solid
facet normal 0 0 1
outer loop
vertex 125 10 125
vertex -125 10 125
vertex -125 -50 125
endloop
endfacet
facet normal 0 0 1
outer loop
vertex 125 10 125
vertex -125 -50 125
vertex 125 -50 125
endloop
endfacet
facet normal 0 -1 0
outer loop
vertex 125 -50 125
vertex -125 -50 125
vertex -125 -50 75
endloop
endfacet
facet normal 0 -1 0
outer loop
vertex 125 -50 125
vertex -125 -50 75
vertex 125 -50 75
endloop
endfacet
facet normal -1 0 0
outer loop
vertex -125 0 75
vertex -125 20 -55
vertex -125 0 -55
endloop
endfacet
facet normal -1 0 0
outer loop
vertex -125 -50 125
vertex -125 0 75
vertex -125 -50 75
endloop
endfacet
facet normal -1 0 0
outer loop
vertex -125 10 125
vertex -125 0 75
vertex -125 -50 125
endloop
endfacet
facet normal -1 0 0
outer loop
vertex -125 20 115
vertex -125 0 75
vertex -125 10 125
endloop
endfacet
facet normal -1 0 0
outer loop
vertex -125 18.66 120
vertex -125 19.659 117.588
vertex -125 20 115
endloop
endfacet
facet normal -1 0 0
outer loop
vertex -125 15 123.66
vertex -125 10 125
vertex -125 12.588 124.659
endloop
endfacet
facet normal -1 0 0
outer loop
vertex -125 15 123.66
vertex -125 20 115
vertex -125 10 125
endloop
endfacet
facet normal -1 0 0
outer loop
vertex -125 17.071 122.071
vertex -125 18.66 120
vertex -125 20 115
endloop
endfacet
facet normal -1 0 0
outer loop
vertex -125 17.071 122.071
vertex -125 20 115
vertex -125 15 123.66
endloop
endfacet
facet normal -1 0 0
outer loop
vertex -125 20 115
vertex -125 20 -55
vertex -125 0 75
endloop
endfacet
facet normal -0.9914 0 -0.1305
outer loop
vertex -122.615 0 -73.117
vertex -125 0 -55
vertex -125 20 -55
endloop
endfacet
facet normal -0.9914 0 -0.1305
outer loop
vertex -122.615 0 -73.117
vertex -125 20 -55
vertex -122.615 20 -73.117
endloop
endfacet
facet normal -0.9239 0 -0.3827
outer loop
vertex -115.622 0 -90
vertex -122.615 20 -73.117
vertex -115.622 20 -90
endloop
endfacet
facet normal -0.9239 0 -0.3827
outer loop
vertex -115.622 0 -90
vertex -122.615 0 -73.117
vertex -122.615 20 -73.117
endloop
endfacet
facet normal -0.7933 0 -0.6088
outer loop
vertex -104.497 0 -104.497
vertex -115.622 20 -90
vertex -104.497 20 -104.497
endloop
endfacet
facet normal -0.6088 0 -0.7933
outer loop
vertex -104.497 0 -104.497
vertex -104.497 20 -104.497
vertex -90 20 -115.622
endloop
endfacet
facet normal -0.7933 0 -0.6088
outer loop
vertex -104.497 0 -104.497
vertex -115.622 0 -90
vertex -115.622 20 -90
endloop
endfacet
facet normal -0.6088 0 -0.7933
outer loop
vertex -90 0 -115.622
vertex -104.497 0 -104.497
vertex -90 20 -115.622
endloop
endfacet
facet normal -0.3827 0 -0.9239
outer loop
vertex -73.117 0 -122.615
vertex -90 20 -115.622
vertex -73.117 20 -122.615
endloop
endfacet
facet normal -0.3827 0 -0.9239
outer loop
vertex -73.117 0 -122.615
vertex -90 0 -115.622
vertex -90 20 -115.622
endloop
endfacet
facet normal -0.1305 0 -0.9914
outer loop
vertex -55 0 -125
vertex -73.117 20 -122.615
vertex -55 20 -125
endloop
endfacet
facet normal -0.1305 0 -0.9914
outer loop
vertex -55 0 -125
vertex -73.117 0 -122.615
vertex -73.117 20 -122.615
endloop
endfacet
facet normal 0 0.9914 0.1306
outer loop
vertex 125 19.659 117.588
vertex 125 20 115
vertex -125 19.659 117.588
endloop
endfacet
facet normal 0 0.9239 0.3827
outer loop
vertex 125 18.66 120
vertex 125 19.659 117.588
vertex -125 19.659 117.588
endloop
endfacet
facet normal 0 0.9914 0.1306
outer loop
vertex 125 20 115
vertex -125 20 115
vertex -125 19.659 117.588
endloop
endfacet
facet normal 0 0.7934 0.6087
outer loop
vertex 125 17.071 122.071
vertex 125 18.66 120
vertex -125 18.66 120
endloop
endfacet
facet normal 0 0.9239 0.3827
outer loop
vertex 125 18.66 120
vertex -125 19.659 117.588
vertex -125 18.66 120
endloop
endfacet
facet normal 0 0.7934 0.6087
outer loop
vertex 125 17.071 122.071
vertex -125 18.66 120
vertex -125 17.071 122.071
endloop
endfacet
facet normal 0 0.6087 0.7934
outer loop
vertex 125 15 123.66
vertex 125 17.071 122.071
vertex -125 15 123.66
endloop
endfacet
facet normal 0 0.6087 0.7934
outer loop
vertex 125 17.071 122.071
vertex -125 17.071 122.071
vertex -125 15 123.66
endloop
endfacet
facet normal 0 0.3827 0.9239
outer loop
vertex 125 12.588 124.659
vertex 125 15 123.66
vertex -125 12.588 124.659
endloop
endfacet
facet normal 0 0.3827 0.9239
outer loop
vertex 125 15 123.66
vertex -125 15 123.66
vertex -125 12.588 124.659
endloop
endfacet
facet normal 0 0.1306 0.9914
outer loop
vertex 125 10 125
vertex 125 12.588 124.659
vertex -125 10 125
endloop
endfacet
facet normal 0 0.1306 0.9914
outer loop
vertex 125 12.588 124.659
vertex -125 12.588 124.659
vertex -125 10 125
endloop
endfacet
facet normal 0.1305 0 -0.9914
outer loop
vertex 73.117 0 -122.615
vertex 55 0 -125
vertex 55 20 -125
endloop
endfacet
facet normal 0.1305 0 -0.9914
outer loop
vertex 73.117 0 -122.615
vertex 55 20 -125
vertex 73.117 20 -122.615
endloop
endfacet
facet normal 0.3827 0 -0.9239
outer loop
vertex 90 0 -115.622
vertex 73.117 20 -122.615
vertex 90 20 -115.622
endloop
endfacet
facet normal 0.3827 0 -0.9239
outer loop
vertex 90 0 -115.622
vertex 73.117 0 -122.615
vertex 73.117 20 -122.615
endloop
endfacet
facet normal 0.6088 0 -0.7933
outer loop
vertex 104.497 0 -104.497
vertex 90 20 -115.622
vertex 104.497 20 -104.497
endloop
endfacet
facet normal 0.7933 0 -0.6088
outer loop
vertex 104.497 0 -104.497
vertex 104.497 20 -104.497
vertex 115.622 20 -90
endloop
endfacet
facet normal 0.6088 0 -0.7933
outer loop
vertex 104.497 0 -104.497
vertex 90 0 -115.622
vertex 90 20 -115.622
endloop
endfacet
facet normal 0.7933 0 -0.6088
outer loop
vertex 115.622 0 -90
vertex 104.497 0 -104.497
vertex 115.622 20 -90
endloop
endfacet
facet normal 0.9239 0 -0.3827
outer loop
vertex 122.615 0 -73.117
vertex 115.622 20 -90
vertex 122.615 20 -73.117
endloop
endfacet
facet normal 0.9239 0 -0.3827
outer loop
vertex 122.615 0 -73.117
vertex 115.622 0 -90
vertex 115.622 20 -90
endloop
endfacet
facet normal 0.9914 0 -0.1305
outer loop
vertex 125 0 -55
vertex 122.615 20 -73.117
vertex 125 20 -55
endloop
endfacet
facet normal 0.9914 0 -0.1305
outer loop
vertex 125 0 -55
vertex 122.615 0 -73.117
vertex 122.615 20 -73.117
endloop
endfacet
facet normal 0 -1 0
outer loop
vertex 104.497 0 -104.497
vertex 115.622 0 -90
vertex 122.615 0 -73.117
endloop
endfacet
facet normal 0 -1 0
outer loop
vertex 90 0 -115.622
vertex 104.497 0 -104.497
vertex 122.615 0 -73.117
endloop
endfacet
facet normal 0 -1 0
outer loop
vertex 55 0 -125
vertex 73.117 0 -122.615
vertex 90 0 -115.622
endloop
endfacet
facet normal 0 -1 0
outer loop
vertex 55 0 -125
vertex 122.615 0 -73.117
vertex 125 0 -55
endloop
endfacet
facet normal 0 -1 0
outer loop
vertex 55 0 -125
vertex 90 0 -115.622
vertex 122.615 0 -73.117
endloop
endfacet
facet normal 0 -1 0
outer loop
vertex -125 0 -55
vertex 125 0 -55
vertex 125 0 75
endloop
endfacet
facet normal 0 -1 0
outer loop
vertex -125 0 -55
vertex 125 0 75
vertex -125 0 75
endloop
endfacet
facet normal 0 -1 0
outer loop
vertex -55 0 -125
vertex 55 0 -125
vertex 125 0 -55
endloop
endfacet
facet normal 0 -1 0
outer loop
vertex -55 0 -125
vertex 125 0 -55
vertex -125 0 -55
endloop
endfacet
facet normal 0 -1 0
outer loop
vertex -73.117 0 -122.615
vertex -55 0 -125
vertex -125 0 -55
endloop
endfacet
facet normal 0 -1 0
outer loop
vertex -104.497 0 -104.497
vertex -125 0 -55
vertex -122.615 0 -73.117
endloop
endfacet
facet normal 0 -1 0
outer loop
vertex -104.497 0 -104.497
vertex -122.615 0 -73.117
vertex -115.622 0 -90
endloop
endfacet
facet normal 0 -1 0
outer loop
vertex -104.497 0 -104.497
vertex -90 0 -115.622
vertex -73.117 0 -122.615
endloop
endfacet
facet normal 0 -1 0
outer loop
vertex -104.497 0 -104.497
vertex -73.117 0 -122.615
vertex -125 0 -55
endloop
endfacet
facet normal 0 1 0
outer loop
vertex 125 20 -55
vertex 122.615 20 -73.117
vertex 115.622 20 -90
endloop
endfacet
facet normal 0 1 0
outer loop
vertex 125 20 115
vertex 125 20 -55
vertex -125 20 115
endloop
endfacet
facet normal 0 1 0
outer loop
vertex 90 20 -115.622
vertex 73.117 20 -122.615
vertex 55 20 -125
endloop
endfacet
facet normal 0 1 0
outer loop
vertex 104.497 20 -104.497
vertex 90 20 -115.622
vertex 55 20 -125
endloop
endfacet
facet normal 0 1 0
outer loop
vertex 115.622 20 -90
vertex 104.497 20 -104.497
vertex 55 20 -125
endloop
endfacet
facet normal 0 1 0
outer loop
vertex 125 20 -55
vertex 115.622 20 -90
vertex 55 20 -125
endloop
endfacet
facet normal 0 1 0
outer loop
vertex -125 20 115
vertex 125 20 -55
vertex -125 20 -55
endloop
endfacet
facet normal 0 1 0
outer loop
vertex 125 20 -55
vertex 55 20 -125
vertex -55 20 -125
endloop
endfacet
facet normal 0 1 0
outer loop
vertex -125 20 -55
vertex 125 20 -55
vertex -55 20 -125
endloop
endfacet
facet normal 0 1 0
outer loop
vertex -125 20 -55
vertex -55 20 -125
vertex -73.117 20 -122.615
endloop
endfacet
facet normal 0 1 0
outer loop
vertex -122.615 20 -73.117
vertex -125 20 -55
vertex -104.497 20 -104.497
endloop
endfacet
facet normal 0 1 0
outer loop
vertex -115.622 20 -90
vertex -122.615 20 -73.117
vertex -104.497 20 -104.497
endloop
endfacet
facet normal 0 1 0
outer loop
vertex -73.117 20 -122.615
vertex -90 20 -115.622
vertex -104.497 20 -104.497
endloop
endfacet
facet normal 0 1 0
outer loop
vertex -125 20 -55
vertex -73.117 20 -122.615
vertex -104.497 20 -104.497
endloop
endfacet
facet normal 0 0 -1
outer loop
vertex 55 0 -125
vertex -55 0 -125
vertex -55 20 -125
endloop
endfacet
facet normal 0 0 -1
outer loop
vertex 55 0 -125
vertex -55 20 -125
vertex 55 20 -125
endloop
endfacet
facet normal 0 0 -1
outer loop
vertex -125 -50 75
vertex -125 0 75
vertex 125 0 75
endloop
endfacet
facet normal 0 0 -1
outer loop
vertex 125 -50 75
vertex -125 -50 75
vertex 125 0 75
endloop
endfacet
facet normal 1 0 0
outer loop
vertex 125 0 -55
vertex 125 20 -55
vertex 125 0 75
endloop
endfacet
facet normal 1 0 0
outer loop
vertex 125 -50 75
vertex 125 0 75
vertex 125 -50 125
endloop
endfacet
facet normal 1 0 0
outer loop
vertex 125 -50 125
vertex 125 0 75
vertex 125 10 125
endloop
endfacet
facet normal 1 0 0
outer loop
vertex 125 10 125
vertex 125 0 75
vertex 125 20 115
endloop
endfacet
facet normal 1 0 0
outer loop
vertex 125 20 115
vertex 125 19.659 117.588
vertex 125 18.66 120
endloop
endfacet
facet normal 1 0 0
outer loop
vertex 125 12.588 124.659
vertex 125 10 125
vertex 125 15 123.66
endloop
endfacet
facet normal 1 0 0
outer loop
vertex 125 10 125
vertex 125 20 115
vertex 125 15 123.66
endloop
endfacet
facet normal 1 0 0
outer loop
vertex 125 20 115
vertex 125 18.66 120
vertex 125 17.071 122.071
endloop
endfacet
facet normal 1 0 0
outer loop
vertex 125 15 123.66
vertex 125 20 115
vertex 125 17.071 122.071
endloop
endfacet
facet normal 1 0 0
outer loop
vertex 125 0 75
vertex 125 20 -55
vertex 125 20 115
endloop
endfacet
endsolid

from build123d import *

# Parameters (mm, degrees)
BOSS_EXTRUDE1_DEPTH = 20
SKETCH2_W           = 250
SKETCH2_H           = 50
BOSS_EXTRUDE2_DEPTH = 50
FILLET1_R           = 10


with BuildPart() as part:
    # Sketch1 → Boss-Extrude1 (new body)
    with BuildSketch(Plane(origin=(0, 0, 0), x_dir=(1, 0, 0), z_dir=(0, 1, 0))):
        with BuildLine():
            Line((-55, 125), (55, 125))
            ThreePointArc((55, 125), (104.497474683, 104.497474683), (125, 55))
            Line((125, 55), (125, -125))
            Line((125, -125), (-125, -125))
            Line((-125, -125), (-125, 55))
            ThreePointArc((-125, 55), (-104.497474683, 104.497474683), (-55, 125))
        make_face()
    extrude(amount=BOSS_EXTRUDE1_DEPTH)

    # Sketch2 → Boss-Extrude2 (add)
    with BuildSketch(Plane.XZ):
        with Locations((0, 100)):
            Rectangle(SKETCH2_W, SKETCH2_H)
    extrude(amount=BOSS_EXTRUDE2_DEPTH)

    # Fillet1
    fillet1_edges = [part.edges().sort_by_distance(p)[0] for p in [
        (0, 20, 125),
    ]]
    fillet(fillet1_edges, radius=FILLET1_R)


solid = part.part
